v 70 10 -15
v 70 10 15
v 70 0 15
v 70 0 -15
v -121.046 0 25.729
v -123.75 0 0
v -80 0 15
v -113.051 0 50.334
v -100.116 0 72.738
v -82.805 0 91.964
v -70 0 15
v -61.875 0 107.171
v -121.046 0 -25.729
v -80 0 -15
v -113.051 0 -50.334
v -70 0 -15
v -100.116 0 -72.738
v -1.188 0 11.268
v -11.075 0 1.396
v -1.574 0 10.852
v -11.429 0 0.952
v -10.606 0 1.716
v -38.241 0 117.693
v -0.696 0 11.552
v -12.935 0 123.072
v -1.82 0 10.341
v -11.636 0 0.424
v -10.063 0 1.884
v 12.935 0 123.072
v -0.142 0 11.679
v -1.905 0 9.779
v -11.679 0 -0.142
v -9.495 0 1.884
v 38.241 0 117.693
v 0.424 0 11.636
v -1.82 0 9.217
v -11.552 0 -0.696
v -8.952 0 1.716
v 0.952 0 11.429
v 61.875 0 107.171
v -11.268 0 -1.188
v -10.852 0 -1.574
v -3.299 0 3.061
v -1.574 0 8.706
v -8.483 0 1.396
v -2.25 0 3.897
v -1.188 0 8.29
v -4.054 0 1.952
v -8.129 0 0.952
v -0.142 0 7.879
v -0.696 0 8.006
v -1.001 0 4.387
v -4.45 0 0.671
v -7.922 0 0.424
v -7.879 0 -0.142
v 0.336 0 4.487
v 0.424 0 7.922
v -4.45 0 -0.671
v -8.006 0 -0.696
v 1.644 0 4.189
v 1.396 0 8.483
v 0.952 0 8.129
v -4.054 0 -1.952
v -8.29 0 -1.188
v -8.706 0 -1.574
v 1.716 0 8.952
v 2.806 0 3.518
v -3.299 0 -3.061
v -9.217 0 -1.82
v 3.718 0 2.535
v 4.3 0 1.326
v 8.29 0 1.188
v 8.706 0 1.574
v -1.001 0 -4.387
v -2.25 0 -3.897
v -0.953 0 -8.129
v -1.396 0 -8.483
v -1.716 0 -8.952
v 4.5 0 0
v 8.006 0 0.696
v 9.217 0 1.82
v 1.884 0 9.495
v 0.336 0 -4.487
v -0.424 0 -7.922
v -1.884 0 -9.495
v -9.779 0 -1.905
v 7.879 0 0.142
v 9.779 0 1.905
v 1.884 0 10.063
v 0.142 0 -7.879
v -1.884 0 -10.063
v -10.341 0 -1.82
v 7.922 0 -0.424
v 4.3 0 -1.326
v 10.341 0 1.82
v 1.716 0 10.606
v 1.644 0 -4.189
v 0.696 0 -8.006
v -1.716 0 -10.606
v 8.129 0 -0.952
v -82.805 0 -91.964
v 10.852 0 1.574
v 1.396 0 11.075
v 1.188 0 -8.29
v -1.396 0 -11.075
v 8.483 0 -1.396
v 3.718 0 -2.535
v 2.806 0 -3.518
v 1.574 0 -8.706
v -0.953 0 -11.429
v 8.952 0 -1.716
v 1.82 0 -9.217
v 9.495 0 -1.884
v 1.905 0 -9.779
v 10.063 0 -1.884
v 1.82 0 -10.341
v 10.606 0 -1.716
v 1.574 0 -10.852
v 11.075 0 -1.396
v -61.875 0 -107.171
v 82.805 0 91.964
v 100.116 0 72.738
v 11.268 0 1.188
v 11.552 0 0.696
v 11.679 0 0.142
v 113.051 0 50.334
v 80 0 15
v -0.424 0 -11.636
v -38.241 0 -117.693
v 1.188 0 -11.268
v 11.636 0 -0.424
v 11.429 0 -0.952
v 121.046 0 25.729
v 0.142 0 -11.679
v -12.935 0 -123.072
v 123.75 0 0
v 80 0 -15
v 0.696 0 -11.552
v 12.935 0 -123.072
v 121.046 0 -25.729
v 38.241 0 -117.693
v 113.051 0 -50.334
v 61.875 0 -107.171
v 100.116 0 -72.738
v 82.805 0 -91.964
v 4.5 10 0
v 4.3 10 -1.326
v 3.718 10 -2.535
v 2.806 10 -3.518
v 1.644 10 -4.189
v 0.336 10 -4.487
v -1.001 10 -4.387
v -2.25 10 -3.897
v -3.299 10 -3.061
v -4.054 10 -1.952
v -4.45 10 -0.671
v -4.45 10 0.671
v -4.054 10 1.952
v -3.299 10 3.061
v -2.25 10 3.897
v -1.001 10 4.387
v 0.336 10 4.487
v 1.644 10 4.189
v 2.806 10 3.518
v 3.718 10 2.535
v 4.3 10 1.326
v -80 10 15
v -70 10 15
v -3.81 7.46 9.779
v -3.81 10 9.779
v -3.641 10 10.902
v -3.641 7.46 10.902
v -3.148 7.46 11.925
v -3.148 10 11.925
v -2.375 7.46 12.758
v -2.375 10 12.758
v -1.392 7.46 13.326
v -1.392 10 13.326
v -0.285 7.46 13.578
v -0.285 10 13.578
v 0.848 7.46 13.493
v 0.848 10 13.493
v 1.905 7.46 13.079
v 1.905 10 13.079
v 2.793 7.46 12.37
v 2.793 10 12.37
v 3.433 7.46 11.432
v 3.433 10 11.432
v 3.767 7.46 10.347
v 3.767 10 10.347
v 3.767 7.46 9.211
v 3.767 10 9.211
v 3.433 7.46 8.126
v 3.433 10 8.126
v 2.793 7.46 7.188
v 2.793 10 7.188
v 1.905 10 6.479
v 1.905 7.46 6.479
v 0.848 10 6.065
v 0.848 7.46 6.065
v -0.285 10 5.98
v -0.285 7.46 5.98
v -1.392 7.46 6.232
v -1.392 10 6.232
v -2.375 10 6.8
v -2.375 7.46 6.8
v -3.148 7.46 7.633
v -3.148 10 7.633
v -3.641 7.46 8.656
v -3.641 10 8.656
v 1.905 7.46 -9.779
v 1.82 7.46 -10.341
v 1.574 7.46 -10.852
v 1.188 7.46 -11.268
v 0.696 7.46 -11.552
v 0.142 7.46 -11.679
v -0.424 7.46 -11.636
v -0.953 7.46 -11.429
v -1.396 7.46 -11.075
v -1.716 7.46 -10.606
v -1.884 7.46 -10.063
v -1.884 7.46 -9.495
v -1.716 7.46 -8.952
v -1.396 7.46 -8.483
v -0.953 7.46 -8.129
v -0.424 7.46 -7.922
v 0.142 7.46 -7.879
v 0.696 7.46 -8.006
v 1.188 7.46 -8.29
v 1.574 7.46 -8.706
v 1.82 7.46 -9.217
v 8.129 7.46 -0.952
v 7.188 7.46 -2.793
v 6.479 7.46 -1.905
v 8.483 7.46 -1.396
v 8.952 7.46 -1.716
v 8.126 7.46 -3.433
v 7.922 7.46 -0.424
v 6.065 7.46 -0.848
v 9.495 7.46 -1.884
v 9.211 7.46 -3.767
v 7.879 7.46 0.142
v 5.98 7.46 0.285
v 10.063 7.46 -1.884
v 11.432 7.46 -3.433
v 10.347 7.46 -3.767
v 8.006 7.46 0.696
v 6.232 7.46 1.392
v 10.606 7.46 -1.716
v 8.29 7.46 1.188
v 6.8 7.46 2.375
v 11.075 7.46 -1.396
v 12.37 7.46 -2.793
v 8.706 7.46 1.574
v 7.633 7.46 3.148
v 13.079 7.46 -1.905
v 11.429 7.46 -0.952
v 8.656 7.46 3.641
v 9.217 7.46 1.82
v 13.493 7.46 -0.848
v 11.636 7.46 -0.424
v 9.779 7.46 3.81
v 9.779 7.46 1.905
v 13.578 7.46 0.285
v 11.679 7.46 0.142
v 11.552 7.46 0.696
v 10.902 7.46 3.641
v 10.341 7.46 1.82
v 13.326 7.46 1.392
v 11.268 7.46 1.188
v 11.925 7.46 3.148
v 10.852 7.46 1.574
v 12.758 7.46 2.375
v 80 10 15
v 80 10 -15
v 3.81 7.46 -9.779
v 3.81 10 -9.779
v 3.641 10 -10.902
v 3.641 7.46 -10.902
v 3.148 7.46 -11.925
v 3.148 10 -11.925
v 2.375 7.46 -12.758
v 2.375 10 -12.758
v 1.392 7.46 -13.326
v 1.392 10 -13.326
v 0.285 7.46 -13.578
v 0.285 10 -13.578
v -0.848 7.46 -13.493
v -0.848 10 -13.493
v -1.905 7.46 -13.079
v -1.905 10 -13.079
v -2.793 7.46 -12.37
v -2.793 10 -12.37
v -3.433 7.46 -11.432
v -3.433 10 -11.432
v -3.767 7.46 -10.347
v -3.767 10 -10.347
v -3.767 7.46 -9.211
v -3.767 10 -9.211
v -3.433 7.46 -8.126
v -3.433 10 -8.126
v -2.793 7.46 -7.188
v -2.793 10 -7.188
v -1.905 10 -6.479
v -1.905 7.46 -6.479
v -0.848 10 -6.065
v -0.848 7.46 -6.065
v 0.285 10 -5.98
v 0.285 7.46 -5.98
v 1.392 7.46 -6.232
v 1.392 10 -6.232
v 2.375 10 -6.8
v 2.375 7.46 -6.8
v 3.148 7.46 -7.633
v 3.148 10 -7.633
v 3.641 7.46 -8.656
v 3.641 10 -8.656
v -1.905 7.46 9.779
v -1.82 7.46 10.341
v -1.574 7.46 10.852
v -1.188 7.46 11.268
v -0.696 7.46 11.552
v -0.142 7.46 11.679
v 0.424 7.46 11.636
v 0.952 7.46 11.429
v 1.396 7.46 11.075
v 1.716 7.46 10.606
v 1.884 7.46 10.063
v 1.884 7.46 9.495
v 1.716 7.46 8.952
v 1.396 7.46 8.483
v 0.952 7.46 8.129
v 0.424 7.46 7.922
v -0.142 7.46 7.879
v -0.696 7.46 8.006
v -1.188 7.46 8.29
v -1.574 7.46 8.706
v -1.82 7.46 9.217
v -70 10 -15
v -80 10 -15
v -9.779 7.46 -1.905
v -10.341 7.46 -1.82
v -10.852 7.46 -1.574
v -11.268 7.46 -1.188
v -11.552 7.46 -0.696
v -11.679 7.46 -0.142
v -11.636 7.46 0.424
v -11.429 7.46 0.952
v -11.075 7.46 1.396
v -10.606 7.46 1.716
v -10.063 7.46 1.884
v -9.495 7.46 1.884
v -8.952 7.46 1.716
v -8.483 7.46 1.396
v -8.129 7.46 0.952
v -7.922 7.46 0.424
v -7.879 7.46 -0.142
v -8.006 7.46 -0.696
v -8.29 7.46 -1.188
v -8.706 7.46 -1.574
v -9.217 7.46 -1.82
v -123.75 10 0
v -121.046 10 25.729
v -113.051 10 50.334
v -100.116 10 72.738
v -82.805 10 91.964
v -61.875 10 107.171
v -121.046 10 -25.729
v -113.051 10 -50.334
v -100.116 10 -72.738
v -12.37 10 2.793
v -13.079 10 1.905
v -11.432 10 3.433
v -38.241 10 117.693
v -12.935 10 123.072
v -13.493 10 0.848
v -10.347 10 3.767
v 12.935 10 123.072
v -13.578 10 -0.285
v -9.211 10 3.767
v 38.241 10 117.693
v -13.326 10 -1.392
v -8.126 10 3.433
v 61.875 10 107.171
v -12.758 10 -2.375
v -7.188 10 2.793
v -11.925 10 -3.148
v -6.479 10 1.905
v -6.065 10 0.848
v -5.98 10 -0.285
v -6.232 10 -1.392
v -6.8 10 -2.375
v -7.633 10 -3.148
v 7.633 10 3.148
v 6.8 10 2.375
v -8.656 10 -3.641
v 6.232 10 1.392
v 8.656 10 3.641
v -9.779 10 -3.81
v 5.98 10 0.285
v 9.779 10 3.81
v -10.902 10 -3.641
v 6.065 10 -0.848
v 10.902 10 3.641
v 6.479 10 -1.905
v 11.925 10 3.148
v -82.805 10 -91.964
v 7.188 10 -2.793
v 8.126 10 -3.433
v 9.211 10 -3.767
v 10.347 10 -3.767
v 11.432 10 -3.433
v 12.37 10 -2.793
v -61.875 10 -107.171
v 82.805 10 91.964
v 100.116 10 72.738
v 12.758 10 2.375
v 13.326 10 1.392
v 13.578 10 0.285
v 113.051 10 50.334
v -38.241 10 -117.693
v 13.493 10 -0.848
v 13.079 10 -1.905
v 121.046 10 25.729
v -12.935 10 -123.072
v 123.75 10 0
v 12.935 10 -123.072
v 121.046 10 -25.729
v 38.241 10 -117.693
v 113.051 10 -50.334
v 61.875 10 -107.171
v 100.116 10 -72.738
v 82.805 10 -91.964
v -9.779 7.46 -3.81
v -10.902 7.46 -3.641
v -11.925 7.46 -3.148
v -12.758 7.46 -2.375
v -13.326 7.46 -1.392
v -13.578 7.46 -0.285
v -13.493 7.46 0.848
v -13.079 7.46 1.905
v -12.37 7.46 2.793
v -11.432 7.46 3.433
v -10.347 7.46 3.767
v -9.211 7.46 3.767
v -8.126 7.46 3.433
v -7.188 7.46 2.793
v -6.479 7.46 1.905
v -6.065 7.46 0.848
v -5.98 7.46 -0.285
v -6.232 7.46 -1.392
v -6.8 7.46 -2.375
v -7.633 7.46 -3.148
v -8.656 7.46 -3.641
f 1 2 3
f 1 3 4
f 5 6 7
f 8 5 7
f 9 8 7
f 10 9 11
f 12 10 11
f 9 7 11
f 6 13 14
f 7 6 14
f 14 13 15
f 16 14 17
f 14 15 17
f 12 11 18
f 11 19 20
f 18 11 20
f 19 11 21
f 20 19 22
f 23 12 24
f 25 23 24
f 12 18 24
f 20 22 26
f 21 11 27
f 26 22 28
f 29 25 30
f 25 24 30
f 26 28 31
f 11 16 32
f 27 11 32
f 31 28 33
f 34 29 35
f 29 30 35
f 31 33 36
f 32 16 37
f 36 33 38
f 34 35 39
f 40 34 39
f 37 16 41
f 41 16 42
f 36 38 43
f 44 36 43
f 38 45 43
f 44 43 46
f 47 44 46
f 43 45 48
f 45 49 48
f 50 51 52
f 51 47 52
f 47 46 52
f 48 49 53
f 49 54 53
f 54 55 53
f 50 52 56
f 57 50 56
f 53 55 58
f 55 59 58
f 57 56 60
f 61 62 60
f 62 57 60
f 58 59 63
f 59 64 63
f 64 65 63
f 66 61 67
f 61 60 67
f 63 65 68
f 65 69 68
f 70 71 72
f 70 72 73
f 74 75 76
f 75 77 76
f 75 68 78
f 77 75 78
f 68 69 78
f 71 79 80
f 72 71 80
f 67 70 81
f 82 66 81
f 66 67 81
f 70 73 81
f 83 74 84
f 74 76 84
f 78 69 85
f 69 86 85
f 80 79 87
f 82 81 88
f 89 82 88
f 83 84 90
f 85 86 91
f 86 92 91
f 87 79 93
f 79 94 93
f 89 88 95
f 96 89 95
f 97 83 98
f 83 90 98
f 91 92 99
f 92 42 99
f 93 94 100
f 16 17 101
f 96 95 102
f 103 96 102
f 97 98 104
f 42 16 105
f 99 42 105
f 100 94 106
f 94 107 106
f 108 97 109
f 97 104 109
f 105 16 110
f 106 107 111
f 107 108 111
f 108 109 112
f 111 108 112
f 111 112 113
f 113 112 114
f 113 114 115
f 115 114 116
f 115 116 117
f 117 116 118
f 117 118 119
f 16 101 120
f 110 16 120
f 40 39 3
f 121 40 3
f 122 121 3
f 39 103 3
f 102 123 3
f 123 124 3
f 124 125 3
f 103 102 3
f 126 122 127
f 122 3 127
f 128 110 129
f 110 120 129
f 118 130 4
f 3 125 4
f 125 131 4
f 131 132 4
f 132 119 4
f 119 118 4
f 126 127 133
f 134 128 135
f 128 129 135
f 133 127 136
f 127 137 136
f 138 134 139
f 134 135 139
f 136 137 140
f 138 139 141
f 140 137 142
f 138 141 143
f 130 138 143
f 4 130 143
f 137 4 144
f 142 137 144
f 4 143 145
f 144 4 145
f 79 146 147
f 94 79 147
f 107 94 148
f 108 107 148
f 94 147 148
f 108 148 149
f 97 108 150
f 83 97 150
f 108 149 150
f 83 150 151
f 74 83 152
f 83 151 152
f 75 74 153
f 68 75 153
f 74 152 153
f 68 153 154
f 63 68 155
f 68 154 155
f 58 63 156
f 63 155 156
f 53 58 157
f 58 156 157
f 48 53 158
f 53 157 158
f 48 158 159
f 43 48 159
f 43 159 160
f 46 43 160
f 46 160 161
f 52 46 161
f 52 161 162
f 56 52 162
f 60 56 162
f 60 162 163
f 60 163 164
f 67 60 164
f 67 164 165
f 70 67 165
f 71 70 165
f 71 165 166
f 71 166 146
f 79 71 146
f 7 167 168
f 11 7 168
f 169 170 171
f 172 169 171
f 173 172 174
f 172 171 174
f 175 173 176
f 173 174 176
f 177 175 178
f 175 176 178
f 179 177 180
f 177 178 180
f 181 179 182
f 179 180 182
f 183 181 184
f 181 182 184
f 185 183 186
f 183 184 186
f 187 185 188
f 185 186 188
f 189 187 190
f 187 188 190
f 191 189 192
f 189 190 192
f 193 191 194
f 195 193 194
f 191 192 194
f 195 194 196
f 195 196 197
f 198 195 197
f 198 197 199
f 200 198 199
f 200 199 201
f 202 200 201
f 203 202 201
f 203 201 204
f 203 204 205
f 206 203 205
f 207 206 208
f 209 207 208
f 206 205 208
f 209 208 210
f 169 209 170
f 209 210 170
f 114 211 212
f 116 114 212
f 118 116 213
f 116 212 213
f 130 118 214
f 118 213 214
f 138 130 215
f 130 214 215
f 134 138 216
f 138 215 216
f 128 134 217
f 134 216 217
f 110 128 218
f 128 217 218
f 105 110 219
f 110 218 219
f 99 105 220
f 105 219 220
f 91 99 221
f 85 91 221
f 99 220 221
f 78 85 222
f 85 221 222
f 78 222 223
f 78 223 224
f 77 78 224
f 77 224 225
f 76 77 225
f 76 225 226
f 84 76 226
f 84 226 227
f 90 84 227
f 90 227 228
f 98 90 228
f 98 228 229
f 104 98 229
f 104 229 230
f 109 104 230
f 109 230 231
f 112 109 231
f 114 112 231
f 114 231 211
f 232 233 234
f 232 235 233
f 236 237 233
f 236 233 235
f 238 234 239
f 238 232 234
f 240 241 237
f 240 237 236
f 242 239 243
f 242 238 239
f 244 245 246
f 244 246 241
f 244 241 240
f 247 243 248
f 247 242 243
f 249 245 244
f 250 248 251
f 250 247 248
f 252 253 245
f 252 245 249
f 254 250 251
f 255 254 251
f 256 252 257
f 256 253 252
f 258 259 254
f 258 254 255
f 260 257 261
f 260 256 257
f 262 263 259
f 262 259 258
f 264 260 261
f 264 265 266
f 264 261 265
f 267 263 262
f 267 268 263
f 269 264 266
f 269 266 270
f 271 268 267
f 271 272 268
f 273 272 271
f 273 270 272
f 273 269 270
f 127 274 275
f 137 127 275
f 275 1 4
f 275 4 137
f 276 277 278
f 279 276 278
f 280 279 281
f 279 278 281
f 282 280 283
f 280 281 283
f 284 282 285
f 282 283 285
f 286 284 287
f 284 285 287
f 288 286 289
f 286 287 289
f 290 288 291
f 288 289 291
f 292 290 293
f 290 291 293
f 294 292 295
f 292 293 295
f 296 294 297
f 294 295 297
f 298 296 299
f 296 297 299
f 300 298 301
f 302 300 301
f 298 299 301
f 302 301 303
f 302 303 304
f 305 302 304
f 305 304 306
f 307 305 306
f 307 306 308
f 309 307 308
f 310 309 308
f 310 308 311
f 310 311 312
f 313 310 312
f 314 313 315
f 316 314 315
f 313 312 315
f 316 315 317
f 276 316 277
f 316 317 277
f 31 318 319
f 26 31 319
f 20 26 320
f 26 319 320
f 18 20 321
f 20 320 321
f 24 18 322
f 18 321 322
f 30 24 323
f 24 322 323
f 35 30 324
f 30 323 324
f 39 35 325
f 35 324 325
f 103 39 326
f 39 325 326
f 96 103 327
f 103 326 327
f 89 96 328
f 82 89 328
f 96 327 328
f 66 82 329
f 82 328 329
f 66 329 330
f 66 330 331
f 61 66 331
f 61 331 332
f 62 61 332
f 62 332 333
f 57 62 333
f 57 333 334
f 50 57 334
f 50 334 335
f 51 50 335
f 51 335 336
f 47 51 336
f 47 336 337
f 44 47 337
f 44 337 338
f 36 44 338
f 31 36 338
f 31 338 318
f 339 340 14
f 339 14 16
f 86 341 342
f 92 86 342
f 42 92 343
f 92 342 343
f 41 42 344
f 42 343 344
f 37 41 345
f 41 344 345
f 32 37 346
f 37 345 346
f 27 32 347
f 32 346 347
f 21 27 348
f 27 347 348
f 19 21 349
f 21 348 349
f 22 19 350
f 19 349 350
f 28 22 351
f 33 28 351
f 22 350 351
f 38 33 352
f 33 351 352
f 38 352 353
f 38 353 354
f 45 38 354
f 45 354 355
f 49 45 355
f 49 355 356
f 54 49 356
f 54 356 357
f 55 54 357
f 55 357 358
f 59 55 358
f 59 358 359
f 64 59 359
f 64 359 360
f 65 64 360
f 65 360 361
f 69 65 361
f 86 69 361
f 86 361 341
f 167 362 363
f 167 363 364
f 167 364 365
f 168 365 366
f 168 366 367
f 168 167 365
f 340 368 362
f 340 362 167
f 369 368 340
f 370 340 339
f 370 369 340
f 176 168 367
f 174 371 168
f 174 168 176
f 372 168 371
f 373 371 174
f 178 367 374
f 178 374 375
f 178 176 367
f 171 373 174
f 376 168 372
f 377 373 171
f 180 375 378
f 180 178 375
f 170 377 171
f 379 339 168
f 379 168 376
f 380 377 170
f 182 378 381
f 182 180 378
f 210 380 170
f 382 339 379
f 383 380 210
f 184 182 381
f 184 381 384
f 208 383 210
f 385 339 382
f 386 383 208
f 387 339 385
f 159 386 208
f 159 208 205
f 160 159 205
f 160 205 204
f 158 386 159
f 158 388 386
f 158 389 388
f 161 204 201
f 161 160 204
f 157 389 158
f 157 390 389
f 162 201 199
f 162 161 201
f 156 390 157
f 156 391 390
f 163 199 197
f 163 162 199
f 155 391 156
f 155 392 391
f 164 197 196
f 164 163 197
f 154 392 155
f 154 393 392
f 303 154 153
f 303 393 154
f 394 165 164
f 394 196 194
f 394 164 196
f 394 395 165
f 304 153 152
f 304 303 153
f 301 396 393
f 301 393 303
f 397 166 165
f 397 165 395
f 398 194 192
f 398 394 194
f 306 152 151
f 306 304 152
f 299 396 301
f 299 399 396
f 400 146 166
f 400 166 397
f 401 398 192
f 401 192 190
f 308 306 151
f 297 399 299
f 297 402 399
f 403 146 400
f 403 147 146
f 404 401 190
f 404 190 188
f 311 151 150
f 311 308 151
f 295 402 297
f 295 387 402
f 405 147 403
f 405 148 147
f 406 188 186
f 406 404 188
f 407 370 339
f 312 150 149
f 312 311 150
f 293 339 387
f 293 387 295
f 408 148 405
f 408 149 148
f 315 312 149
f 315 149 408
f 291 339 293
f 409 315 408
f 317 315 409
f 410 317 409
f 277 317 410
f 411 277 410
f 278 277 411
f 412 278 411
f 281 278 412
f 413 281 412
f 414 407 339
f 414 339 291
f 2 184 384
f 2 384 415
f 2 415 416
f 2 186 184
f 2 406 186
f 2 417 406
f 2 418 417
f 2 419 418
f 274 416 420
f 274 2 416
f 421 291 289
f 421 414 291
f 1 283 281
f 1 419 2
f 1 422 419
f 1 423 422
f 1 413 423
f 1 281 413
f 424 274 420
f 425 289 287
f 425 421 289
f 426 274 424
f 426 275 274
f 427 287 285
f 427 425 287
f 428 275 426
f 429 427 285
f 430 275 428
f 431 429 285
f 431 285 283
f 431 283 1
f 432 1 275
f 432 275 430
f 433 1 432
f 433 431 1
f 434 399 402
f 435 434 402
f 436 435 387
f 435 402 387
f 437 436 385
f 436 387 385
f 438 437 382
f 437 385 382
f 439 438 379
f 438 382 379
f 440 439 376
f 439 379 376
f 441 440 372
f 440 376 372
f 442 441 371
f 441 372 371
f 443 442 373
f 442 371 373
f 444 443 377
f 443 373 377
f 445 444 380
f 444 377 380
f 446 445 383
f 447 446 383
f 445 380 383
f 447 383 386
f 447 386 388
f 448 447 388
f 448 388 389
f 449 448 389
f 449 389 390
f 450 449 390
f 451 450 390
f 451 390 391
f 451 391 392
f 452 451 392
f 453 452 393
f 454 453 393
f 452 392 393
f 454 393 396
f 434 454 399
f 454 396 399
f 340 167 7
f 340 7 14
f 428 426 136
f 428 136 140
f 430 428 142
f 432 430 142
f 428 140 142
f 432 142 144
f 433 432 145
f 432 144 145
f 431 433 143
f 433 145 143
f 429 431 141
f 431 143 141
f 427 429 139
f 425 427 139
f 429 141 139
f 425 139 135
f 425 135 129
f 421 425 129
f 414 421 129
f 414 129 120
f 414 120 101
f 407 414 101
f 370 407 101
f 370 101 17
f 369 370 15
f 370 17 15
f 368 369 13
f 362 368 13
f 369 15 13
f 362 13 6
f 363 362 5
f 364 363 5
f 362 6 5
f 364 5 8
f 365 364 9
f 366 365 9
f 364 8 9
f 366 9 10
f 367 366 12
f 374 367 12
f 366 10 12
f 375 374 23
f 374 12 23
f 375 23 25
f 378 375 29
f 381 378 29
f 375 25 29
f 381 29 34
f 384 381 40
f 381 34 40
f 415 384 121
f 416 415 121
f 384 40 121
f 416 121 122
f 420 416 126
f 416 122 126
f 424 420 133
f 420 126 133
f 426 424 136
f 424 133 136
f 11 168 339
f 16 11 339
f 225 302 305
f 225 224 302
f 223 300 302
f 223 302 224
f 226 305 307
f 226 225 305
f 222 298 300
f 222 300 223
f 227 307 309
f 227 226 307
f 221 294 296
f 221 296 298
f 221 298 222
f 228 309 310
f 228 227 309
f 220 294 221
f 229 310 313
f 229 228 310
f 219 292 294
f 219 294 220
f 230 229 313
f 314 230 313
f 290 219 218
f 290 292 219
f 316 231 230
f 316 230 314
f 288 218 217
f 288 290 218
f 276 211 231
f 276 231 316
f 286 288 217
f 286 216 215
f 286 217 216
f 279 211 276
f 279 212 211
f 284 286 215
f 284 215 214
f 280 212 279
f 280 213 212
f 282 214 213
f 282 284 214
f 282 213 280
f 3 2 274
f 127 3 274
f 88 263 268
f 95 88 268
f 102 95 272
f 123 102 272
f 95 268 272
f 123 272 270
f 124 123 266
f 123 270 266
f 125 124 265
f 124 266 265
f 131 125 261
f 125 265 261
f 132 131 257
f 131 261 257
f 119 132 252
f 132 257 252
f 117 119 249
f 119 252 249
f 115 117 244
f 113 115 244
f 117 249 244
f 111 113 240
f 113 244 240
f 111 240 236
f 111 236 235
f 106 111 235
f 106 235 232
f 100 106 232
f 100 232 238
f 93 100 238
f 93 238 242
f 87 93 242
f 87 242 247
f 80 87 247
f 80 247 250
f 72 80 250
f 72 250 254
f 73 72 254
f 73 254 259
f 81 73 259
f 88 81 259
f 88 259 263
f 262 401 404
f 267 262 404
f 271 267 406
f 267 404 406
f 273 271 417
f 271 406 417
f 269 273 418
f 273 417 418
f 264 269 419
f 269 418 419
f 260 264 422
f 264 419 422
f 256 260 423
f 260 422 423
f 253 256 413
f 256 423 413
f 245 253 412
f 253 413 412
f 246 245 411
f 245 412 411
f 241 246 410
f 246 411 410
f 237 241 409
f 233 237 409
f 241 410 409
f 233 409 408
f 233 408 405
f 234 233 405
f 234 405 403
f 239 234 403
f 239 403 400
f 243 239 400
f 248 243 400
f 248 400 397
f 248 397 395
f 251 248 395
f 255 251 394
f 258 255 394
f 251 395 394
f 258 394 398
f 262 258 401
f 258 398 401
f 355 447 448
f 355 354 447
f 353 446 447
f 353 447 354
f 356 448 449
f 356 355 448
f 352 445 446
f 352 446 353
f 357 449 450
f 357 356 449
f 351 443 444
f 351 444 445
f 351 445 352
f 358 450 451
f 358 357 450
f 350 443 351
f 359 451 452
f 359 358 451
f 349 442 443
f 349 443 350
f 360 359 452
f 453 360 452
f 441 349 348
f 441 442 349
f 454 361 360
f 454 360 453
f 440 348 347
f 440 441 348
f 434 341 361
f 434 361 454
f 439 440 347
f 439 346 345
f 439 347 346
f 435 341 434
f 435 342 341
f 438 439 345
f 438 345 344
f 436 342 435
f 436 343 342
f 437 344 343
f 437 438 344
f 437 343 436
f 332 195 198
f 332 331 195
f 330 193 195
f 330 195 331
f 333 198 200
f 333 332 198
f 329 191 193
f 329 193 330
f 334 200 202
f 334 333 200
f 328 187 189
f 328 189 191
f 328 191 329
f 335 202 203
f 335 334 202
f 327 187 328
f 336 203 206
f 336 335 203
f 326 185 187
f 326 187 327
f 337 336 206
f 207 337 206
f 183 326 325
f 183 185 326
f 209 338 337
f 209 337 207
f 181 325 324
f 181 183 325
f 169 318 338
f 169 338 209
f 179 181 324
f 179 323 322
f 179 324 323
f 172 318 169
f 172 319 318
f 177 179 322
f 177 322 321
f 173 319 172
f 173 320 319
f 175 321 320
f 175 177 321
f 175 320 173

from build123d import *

# Parameters (mm, degrees)
SKETCH1_R           = 123.75
BOSS_EXTRUDE1_DEPTH = 10
SKETCH2_R           = 1.905
CUT_EXTRUDE2_DEPTH  = 11
CIRPATTERN1_COUNT   = 4
SKETCH3_R           = 4.5
CUT_EXTRUDE3_DEPTH  = 11
SKETCH4_R           = 3.81
CUT_EXTRUDE4_DEPTH  = 2.54
CIRPATTERN2_COUNT   = 4
SKETCH5_W           = 10
SKETCH5_H           = 30
CUT_EXTRUDE5_DEPTH  = 11


with BuildPart() as part:
    # Sketch1 → Boss-Extrude1 (new body)
    with BuildSketch(Plane(origin=(0, 0, 0), x_dir=(1, 0, 0), z_dir=(0, 1, 0))):
        Circle(SKETCH1_R)
    extrude(amount=BOSS_EXTRUDE1_DEPTH)

    # Sketch2 → Cut-Extrude2 (cut, through all)
    with BuildSketch(Plane(origin=(0, 10, 0), x_dir=(1, 0, 0), z_dir=(0, 1, 0))):
        with Locations((0, 9.779)):
            Circle(SKETCH2_R)
    cut_extrude2 = extrude(amount=-CUT_EXTRUDE2_DEPTH, mode=Mode.SUBTRACT)

    # CirPattern1: Cut-Extrude2 ×4 about axis
    cirpattern1_axis = Axis((0, 0, 0), (0, 1, 0))
    for i in range(1, CIRPATTERN1_COUNT):
        add(cut_extrude2.rotate(cirpattern1_axis, i * 360 / CIRPATTERN1_COUNT), mode=Mode.SUBTRACT)

    # Sketch3 → Cut-Extrude3 (cut, through all)
    with BuildSketch(Plane(origin=(0, 10, 0), x_dir=(1, 0, 0), z_dir=(0, 1, 0))):
        Circle(SKETCH3_R)
    extrude(amount=-CUT_EXTRUDE3_DEPTH, mode=Mode.SUBTRACT)

    # Sketch4 → Cut-Extrude4 (cut)
    with BuildSketch(Plane(origin=(0, 10, 0), x_dir=(1, 0, 0), z_dir=(0, 1, 0))):
        with Locations((0, 9.779)):
            Circle(SKETCH4_R)
    cut_extrude4 = extrude(amount=-CUT_EXTRUDE4_DEPTH, mode=Mode.SUBTRACT)

    # CirPattern2: Cut-Extrude4 ×4 about axis
    cirpattern2_axis = Axis((0, 0, 0), (0, 1, 0))
    for i in range(1, CIRPATTERN2_COUNT):
        add(cut_extrude4.rotate(cirpattern2_axis, i * 360 / CIRPATTERN2_COUNT), mode=Mode.SUBTRACT)

    # Sketch5 → Cut-Extrude5 (cut, through all)
    with BuildSketch(Plane(origin=(0, 10, 0), x_dir=(1, 0, 0), z_dir=(0, 1, 0))):
        with Locations((75, 0)):
            Rectangle(SKETCH5_W, SKETCH5_H)
        with Locations((-75, 0)):
            Rectangle(SKETCH5_W, SKETCH5_H)
    extrude(amount=-CUT_EXTRUDE5_DEPTH, mode=Mode.SUBTRACT)


solid = part.part
